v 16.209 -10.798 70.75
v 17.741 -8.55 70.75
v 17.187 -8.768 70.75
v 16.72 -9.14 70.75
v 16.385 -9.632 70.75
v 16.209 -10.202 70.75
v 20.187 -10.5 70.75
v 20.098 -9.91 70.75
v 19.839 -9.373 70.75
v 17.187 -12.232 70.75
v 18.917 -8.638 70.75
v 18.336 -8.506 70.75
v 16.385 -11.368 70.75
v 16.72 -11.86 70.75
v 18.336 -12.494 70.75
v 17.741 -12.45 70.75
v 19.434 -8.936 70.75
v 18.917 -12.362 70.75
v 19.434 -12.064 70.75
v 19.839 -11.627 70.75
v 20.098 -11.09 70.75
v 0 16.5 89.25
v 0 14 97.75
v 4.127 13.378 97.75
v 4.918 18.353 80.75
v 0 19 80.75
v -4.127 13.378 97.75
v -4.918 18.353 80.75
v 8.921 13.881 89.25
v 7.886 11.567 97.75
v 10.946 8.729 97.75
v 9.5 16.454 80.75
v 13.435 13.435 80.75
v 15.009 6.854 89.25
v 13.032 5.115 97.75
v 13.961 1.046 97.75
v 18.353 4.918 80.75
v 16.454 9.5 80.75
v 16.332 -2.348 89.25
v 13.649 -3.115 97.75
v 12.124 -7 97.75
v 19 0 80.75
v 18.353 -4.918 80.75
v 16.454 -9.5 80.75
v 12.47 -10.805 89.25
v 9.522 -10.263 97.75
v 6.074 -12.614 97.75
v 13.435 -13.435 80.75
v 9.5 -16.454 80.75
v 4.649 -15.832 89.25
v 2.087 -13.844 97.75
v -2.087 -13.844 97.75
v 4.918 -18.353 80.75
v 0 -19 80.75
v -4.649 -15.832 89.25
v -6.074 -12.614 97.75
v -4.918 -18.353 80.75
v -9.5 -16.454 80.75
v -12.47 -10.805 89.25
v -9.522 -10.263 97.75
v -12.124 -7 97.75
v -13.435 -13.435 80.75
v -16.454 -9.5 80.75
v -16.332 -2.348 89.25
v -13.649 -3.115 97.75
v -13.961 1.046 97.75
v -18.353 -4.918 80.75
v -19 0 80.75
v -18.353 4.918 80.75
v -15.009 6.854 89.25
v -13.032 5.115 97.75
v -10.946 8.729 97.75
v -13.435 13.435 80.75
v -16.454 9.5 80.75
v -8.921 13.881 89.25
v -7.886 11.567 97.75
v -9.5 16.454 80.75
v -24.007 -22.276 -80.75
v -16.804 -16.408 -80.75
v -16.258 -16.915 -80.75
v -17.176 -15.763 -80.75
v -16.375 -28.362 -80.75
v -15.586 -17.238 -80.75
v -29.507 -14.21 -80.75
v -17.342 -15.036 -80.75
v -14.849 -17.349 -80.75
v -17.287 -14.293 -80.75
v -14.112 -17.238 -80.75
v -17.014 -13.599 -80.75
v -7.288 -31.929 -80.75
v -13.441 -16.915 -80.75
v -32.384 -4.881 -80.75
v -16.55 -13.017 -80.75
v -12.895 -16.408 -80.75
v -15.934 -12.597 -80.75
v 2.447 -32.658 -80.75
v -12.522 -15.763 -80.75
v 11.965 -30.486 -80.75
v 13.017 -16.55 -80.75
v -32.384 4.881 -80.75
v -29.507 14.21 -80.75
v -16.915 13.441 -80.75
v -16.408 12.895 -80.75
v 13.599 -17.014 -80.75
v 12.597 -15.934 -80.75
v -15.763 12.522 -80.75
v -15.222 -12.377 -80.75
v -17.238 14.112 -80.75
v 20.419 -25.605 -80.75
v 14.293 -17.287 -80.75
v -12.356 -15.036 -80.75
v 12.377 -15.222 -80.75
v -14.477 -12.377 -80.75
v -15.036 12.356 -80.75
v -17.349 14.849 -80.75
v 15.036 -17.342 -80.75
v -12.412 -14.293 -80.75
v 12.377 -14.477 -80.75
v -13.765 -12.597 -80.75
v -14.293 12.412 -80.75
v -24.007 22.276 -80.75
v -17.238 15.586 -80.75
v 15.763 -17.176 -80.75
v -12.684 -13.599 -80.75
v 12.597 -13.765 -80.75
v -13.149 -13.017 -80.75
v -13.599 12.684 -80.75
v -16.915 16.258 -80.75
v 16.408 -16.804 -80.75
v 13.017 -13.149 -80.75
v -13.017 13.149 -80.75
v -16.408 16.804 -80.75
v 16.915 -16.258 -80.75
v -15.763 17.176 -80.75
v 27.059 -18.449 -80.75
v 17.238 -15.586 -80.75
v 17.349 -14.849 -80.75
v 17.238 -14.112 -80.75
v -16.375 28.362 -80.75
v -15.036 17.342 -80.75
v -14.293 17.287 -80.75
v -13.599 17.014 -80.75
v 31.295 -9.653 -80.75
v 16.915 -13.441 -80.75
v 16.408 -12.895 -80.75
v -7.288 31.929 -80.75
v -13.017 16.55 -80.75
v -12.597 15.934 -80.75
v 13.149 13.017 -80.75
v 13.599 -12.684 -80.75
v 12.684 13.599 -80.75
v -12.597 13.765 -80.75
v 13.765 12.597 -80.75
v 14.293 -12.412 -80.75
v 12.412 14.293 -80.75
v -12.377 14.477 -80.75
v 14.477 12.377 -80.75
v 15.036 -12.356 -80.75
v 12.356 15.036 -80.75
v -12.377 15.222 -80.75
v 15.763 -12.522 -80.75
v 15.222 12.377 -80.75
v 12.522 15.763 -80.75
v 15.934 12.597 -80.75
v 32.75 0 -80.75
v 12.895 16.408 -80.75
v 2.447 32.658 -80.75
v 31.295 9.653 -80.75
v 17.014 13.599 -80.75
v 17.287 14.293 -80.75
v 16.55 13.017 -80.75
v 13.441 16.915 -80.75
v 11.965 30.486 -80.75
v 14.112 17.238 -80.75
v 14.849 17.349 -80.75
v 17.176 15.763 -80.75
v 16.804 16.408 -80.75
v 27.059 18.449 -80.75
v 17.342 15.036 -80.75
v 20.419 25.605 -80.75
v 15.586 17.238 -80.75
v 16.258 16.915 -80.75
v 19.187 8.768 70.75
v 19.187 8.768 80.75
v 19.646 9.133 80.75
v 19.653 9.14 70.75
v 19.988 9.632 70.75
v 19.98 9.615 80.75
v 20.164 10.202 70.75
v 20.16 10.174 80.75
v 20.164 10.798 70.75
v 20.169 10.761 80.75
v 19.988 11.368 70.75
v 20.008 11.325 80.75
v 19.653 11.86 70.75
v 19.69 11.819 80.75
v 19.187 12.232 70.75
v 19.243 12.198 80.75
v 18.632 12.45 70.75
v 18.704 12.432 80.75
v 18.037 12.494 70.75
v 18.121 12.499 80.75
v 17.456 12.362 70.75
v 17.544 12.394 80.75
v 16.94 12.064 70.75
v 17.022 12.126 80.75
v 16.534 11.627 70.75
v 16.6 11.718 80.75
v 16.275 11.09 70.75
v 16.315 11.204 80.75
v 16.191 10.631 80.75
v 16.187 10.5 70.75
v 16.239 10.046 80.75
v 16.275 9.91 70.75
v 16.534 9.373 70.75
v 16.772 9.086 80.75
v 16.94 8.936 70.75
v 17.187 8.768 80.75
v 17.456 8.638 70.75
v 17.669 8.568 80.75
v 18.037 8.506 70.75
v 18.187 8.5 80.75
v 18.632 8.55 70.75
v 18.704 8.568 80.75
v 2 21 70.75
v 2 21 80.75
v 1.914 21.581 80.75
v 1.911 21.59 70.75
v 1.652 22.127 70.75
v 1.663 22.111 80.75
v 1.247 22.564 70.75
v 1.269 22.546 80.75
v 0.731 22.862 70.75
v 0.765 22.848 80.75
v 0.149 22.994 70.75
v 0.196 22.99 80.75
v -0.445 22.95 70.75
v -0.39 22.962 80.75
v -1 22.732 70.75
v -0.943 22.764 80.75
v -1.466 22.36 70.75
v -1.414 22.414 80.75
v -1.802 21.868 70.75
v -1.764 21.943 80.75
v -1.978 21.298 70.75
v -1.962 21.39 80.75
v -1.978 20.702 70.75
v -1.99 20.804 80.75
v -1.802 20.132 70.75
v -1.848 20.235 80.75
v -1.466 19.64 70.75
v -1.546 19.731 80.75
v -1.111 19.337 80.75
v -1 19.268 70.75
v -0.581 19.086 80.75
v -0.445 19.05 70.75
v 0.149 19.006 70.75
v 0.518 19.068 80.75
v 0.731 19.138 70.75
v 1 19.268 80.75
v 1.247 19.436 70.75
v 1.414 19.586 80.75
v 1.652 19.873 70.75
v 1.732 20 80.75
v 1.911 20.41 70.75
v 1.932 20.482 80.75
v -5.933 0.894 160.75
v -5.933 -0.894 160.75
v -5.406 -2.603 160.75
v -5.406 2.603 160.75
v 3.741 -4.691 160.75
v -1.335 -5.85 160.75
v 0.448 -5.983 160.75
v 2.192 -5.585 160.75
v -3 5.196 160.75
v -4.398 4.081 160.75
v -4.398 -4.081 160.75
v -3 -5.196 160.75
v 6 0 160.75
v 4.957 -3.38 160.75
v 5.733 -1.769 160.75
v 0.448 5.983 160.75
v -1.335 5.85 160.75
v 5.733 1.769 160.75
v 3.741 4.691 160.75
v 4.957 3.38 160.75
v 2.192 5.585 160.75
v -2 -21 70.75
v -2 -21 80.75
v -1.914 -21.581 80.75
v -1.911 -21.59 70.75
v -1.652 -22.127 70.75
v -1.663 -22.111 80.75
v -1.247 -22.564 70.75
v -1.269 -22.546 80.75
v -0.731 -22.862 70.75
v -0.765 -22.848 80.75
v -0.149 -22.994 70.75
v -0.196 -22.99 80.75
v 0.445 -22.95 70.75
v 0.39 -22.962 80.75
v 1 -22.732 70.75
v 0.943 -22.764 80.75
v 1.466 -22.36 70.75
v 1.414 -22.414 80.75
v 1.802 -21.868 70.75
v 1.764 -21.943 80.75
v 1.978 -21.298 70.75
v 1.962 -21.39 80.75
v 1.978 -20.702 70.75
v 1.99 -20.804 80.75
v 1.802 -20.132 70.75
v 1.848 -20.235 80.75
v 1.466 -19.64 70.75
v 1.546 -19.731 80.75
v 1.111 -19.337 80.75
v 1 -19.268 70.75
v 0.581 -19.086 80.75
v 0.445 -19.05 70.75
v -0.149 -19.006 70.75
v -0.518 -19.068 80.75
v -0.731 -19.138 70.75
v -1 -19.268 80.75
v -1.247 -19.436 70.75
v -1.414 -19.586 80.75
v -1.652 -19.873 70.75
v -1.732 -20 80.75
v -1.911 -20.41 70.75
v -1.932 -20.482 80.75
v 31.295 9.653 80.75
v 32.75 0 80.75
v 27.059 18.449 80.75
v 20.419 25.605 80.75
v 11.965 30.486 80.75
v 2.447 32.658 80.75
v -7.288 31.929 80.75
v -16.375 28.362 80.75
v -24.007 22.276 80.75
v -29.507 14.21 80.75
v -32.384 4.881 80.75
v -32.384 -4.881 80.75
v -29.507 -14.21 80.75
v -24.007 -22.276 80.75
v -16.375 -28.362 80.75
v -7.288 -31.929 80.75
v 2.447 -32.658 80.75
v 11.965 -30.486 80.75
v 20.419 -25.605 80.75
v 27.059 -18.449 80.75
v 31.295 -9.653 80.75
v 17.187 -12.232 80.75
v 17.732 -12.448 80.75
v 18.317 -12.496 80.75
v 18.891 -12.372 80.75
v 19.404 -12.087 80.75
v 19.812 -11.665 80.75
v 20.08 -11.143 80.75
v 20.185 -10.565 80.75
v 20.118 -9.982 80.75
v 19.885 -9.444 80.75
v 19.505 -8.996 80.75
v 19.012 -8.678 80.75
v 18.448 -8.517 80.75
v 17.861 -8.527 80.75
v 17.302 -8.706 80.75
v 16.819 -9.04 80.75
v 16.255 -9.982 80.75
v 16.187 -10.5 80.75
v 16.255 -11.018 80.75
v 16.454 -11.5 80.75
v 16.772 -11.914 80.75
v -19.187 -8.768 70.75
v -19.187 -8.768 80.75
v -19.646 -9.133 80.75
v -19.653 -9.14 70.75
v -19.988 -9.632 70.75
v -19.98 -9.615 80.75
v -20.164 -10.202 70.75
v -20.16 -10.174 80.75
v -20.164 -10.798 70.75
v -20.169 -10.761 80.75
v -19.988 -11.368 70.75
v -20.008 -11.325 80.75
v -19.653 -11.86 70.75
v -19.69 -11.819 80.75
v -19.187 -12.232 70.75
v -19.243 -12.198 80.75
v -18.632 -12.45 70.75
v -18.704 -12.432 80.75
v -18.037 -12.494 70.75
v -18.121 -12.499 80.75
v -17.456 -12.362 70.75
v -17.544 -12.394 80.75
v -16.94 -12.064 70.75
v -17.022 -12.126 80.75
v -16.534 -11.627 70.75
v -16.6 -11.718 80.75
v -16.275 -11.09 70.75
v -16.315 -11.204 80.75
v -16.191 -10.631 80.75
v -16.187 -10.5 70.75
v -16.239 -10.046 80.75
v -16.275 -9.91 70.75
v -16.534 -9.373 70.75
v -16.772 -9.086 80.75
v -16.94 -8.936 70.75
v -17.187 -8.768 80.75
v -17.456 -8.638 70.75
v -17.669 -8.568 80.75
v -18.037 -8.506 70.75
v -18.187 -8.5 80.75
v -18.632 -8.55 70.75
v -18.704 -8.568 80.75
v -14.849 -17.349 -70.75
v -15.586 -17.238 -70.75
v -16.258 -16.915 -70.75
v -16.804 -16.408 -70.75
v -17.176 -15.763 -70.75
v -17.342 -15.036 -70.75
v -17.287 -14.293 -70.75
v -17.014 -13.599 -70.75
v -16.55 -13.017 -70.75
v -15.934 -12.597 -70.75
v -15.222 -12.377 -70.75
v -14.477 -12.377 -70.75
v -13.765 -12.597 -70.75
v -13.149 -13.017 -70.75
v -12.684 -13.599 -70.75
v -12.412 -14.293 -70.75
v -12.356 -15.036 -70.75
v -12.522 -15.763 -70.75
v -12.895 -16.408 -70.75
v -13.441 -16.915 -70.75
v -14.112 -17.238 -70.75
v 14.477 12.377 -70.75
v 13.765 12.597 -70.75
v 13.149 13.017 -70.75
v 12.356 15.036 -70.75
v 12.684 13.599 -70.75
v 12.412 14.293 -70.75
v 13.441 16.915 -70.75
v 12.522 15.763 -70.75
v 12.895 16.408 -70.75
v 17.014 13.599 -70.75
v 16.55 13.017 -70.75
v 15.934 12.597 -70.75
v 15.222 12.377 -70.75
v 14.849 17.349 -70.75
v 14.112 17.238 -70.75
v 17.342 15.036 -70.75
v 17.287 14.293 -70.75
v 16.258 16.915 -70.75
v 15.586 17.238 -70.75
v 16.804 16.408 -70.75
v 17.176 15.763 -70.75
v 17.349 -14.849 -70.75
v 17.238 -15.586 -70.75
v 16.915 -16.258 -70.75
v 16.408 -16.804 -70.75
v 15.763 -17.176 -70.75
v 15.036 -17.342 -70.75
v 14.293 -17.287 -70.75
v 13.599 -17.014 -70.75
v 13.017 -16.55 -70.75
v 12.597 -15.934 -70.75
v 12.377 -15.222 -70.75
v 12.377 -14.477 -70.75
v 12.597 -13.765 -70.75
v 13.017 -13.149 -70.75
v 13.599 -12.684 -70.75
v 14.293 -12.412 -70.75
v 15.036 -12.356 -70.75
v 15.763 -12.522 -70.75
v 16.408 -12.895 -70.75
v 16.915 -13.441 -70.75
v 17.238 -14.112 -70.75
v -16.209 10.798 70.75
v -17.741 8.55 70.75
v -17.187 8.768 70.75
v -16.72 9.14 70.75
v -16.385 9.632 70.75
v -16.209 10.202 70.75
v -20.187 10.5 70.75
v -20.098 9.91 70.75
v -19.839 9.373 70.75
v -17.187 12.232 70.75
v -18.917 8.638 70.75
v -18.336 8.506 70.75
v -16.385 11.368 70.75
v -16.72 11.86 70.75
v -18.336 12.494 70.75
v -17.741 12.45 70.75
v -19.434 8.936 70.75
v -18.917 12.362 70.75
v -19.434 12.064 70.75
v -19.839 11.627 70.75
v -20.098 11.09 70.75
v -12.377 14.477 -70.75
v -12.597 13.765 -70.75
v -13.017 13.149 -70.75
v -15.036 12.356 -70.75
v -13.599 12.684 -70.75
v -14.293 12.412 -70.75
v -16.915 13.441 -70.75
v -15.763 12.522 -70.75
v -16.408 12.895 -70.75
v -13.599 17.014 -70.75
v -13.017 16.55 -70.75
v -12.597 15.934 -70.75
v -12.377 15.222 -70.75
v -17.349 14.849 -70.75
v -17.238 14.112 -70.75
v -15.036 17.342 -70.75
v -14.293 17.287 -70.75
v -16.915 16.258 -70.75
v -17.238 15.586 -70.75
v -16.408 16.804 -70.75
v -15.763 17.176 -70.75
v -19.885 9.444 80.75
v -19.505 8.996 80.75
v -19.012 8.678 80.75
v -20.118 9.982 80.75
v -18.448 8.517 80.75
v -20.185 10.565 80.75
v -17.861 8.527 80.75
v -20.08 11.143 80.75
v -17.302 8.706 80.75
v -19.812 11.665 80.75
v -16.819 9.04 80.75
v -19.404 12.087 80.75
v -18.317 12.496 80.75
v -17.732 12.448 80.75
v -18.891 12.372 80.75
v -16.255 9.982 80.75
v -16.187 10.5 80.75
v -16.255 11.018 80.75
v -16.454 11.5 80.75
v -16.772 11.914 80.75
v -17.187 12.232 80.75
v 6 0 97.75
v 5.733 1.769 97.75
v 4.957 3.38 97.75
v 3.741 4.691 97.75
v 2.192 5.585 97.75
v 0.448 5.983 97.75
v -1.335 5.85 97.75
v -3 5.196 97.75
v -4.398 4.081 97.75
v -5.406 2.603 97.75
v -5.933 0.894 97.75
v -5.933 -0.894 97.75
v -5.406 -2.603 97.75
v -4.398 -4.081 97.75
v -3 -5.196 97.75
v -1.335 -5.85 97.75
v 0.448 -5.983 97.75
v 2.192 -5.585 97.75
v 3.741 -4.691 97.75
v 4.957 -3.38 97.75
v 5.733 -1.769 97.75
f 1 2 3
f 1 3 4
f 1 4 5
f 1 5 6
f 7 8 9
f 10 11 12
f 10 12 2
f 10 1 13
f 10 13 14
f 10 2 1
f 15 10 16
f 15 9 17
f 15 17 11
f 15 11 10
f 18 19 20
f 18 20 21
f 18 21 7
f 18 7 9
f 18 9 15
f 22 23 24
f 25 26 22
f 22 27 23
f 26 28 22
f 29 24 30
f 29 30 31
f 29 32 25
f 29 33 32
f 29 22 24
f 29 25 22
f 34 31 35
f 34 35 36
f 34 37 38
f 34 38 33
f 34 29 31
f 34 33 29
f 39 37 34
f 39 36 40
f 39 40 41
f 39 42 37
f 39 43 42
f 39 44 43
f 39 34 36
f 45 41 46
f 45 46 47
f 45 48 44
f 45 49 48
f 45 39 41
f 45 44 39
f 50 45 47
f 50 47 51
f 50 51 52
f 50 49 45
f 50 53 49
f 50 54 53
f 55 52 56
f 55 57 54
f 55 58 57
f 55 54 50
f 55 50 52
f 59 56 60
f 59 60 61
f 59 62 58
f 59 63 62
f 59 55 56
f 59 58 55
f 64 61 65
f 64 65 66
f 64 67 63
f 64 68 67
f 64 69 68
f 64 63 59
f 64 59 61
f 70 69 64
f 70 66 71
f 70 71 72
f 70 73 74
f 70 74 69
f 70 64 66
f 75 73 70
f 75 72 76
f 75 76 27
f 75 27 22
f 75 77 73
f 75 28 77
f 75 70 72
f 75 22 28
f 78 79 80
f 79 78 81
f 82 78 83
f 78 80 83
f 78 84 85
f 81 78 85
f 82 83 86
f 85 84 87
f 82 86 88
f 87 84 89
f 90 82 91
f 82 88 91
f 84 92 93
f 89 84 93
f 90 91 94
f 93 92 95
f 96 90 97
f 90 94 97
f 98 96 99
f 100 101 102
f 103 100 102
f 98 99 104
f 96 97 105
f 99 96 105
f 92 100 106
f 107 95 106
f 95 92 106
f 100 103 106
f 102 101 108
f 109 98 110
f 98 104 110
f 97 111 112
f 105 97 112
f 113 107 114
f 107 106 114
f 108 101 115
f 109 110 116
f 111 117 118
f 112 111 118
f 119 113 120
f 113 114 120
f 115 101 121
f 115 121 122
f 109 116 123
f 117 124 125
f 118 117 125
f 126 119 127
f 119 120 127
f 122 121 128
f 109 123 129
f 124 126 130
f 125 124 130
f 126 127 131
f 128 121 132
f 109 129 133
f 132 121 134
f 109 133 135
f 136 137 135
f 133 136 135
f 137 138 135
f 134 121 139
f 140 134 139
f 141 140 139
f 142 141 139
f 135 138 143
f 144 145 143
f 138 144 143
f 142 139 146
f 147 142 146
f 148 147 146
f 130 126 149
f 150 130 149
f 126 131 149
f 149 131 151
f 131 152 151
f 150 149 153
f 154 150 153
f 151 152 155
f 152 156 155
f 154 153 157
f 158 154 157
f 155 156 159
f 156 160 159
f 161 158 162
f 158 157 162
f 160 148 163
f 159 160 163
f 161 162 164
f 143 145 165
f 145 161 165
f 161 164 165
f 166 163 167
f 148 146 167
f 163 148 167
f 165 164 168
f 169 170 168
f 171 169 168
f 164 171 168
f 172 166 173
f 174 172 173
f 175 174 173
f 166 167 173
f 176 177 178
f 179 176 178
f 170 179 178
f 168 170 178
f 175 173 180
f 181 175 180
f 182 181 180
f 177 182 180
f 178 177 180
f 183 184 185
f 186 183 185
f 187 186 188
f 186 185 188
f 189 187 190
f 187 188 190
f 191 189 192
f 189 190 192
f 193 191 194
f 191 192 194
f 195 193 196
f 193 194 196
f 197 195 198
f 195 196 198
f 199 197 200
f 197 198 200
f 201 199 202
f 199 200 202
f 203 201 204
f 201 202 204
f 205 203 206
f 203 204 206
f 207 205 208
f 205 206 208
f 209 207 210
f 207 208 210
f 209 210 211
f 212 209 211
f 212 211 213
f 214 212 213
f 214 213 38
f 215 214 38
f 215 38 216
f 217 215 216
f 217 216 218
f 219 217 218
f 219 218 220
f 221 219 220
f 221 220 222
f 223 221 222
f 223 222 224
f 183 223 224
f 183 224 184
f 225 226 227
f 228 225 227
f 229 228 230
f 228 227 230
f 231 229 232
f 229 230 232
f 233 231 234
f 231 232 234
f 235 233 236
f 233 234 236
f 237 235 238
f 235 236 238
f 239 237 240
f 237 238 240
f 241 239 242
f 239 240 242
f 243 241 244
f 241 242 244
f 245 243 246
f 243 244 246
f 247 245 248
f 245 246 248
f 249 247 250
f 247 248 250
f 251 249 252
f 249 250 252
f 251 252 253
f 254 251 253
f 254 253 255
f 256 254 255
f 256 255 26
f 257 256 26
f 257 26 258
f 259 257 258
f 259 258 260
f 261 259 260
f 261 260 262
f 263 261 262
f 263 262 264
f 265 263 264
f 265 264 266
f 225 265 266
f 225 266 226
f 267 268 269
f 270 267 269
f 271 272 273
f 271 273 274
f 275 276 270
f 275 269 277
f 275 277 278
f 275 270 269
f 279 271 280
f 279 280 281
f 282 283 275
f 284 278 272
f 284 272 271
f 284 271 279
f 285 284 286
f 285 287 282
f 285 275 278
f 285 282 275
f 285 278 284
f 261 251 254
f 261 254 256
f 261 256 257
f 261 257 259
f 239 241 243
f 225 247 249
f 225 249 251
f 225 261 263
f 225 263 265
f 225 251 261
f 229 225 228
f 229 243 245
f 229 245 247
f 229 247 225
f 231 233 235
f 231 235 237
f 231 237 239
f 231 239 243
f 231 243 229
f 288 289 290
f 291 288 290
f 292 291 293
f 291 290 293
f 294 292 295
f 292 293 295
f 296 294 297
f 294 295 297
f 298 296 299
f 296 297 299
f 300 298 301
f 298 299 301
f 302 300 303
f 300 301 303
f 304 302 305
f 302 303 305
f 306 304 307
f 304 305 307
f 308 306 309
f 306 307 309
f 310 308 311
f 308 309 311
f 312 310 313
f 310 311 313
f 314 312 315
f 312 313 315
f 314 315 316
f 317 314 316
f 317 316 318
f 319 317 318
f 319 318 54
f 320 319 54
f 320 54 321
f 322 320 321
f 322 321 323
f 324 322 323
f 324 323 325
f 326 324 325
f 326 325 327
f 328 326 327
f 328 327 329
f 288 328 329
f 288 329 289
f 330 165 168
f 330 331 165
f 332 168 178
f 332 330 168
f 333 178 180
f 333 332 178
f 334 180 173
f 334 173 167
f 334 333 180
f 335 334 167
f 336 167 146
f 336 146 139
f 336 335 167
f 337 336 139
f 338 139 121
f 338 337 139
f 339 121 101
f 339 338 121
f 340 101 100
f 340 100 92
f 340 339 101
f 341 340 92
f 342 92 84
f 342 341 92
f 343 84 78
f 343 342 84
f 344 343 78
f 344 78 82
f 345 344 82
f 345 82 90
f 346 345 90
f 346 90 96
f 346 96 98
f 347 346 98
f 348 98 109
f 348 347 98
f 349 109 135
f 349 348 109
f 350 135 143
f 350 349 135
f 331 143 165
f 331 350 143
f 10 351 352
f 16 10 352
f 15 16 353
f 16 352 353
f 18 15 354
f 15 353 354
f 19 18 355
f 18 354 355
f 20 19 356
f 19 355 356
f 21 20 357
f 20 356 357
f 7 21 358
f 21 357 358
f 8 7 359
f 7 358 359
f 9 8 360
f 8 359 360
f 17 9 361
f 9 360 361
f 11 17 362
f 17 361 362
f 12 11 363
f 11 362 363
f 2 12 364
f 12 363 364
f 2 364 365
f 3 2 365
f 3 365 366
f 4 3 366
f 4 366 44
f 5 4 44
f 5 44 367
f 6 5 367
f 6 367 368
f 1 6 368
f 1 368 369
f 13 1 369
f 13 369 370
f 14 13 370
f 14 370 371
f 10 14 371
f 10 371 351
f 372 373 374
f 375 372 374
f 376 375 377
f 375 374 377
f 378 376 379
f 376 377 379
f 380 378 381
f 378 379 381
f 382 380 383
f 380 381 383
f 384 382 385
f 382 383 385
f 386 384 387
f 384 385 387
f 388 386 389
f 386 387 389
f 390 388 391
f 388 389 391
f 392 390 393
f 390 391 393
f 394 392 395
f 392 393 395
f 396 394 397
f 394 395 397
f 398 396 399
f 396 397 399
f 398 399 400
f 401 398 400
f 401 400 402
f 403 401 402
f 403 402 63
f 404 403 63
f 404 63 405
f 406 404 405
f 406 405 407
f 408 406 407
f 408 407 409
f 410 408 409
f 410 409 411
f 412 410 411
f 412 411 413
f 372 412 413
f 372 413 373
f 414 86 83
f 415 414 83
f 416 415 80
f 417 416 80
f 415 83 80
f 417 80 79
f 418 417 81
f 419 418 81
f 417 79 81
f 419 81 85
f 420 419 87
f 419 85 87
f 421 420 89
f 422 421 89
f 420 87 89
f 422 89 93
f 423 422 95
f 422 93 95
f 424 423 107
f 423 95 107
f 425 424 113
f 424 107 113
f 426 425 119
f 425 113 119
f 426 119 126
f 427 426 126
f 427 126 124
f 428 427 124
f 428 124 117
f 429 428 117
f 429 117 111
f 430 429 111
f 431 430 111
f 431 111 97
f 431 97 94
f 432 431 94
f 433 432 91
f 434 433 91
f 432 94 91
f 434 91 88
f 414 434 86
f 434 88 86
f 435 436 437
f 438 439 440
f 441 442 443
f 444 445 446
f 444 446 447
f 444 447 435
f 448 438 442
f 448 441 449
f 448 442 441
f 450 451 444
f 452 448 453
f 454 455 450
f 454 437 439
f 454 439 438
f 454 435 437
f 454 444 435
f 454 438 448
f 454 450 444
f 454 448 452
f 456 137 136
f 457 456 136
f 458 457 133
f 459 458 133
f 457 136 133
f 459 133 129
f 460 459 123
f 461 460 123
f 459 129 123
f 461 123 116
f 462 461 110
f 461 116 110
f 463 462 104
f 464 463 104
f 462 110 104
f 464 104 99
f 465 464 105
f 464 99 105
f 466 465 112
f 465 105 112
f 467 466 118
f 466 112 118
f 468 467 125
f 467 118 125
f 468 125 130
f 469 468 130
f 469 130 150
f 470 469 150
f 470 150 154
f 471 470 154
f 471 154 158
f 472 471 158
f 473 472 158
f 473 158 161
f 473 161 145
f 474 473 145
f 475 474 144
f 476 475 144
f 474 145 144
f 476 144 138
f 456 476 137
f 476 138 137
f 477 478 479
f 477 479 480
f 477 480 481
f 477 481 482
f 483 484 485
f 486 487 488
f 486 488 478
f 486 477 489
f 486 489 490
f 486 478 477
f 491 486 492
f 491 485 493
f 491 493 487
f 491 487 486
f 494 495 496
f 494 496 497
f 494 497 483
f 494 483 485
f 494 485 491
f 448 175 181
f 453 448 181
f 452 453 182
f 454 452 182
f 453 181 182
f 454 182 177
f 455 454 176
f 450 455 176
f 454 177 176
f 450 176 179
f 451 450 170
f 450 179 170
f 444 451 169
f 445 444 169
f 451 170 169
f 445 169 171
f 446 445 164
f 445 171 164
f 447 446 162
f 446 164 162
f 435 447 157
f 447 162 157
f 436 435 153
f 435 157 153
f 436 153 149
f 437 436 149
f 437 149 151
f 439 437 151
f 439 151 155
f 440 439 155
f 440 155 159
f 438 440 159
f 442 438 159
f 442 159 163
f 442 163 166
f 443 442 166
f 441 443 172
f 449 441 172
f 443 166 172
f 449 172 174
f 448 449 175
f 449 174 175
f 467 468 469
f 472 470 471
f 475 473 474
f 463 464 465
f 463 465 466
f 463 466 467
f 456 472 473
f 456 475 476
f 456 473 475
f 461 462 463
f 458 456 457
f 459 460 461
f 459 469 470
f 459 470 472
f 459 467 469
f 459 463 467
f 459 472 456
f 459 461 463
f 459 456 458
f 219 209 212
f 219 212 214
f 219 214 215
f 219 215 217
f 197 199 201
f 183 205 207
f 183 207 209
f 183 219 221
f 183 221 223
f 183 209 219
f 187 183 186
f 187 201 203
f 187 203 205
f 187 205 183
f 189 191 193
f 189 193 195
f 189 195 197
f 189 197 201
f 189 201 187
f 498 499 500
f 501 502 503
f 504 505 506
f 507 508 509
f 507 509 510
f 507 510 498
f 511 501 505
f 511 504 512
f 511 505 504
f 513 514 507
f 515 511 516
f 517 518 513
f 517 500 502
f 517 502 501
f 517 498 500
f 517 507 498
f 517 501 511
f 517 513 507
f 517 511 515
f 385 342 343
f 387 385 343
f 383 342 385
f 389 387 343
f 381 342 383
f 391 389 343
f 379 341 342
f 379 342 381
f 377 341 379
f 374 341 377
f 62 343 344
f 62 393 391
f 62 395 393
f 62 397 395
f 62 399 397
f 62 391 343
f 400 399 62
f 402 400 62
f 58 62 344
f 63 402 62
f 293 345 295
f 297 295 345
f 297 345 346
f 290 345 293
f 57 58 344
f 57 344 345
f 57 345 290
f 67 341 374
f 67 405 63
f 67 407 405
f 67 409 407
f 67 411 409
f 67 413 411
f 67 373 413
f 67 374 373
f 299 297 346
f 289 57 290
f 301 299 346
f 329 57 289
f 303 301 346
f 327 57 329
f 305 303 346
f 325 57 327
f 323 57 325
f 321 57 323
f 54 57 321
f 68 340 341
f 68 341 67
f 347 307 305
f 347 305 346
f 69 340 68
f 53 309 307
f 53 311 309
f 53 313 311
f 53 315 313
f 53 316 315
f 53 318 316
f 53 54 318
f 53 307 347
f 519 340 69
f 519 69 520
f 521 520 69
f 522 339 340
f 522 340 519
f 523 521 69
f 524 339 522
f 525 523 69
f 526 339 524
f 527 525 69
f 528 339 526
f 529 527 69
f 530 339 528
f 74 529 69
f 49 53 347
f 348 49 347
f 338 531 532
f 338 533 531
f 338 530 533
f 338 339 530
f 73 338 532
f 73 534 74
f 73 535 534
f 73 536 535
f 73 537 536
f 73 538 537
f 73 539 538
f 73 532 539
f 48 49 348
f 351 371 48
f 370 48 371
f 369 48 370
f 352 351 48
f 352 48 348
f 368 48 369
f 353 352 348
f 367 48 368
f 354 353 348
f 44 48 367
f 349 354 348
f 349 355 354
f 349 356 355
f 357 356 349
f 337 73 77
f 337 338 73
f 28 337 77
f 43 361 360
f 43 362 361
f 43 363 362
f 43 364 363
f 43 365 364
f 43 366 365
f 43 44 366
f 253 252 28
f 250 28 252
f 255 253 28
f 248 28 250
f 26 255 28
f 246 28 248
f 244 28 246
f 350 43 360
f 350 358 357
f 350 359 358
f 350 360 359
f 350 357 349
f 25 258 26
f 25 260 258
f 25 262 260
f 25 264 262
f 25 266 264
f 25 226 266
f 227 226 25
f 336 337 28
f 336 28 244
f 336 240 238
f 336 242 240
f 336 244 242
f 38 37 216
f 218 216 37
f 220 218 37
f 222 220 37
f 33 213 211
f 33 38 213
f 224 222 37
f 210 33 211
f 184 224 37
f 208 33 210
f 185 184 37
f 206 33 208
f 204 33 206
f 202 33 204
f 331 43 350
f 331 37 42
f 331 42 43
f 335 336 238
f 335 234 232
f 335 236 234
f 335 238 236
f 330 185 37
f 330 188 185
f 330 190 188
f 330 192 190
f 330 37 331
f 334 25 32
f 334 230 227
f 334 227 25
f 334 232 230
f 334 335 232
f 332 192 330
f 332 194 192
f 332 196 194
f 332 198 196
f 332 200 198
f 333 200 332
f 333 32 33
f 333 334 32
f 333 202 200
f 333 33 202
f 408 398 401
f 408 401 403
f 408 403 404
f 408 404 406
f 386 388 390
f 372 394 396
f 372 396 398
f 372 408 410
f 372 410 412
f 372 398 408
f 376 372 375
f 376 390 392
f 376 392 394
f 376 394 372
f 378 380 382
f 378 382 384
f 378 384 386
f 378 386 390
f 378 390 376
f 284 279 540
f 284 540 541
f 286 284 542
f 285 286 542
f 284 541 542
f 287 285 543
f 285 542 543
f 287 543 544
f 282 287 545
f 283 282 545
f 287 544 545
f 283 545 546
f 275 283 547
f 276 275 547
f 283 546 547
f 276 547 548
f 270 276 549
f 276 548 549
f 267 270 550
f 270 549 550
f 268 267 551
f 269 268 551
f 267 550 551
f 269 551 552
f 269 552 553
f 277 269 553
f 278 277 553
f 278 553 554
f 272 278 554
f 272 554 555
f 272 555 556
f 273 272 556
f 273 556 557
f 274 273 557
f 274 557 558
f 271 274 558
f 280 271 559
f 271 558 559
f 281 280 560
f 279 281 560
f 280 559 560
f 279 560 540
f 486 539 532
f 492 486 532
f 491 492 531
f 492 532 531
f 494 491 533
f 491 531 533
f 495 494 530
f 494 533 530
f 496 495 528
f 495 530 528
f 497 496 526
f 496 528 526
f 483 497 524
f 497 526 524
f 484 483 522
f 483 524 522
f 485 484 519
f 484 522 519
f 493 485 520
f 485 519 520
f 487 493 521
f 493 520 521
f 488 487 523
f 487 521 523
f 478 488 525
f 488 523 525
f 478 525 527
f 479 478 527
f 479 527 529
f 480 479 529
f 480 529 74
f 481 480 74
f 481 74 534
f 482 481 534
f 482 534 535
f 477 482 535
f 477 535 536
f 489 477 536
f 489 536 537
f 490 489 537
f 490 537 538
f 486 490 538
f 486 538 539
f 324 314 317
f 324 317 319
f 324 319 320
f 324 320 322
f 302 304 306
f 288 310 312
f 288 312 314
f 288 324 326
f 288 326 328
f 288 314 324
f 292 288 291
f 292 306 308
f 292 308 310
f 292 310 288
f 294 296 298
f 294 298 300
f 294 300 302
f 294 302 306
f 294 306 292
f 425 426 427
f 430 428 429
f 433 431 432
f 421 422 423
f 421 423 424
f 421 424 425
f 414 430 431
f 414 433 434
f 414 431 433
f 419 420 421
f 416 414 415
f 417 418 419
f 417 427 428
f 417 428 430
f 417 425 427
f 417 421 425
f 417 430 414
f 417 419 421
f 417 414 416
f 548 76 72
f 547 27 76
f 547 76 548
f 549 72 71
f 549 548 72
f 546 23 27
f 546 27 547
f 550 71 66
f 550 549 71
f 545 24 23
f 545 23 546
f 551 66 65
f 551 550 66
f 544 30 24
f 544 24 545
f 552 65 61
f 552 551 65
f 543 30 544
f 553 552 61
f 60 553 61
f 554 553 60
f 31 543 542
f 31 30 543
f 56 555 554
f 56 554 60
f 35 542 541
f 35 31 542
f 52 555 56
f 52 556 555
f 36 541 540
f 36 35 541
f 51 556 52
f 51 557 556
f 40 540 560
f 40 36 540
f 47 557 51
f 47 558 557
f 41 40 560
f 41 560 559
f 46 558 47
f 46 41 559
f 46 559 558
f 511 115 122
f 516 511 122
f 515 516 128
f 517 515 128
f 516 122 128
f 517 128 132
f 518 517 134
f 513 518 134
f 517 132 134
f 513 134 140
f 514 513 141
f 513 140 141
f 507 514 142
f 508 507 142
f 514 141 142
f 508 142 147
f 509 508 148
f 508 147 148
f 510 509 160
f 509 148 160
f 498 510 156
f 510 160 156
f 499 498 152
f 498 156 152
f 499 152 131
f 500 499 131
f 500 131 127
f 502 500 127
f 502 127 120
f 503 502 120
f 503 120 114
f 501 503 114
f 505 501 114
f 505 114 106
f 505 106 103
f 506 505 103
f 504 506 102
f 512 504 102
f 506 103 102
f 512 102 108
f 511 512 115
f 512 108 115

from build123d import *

# Parameters (mm, degrees)
SKETCH1_R           = 32.75
BOSS_EXTRUDE1_DEPTH = 80.75
SKETCH12_R          = 6
BOSS_EXTRUDE5_DEPTH = 63
SKETCH13_R          = 2
CUT_EXTRUDE1_DEPTH  = 10
CIRPATTERN1_COUNT   = 6
SKETCH14_R          = 2.5
CUT_EXTRUDE2_DEPTH  = 10
CIRPATTERN2_COUNT   = 4


with BuildPart() as part:
    # Sketch1 → Boss-Extrude1 (new body, symmetric)
    with BuildSketch(Plane.XY):
        Circle(SKETCH1_R)
    extrude(amount=BOSS_EXTRUDE1_DEPTH, both=True)

    # Sketch10 → Revolve1 (revolve)
    with BuildSketch(Plane(origin=(0, 0, 0), x_dir=(0, 0, -1), z_dir=(1, 0, 0))):
        Polygon((-97.75, 0), (-97.75, 14), (-80.75, 19), (-80.75, 0), align=None)
    revolve(axis=Axis((0, 0, 1000), (0, 0, -1)))

    # Sketch12 → Boss-Extrude5 (add)
    with BuildSketch(Plane.XY.offset(97.75)):
        Circle(SKETCH12_R)
    extrude(amount=BOSS_EXTRUDE5_DEPTH)

    # Sketch13 → Cut-Extrude1 (cut)
    with BuildSketch(Plane.XY.offset(80.75)):
        with Locations((0, 21)):
            Circle(SKETCH13_R)
    cut_extrude1 = extrude(amount=-CUT_EXTRUDE1_DEPTH, mode=Mode.SUBTRACT)

    # CirPattern1: Cut-Extrude1 ×6 about axis
    cirpattern1_axis = Axis((0, 0, 0), (0, 0, 1))
    for i in range(1, CIRPATTERN1_COUNT):
        add(cut_extrude1.rotate(cirpattern1_axis, i * 360 / CIRPATTERN1_COUNT), mode=Mode.SUBTRACT)

    # Sketch14 → Cut-Extrude2 (cut)
    with BuildSketch(Plane(origin=(0, 0, -80.75), x_dir=(-1, 0, 0), z_dir=(0, 0, -1))):
        with Locations((14.849242405, 14.849242405)):
            Circle(SKETCH14_R)
    cut_extrude2 = extrude(amount=-CUT_EXTRUDE2_DEPTH, mode=Mode.SUBTRACT)

    # CirPattern2: Cut-Extrude2 ×4 about axis
    cirpattern2_axis = Axis((0, 0, 0), (0, 0, 1))
    for i in range(1, CIRPATTERN2_COUNT):
        add(cut_extrude2.rotate(cirpattern2_axis, i * 360 / CIRPATTERN2_COUNT), mode=Mode.SUBTRACT)


solid = part.part
